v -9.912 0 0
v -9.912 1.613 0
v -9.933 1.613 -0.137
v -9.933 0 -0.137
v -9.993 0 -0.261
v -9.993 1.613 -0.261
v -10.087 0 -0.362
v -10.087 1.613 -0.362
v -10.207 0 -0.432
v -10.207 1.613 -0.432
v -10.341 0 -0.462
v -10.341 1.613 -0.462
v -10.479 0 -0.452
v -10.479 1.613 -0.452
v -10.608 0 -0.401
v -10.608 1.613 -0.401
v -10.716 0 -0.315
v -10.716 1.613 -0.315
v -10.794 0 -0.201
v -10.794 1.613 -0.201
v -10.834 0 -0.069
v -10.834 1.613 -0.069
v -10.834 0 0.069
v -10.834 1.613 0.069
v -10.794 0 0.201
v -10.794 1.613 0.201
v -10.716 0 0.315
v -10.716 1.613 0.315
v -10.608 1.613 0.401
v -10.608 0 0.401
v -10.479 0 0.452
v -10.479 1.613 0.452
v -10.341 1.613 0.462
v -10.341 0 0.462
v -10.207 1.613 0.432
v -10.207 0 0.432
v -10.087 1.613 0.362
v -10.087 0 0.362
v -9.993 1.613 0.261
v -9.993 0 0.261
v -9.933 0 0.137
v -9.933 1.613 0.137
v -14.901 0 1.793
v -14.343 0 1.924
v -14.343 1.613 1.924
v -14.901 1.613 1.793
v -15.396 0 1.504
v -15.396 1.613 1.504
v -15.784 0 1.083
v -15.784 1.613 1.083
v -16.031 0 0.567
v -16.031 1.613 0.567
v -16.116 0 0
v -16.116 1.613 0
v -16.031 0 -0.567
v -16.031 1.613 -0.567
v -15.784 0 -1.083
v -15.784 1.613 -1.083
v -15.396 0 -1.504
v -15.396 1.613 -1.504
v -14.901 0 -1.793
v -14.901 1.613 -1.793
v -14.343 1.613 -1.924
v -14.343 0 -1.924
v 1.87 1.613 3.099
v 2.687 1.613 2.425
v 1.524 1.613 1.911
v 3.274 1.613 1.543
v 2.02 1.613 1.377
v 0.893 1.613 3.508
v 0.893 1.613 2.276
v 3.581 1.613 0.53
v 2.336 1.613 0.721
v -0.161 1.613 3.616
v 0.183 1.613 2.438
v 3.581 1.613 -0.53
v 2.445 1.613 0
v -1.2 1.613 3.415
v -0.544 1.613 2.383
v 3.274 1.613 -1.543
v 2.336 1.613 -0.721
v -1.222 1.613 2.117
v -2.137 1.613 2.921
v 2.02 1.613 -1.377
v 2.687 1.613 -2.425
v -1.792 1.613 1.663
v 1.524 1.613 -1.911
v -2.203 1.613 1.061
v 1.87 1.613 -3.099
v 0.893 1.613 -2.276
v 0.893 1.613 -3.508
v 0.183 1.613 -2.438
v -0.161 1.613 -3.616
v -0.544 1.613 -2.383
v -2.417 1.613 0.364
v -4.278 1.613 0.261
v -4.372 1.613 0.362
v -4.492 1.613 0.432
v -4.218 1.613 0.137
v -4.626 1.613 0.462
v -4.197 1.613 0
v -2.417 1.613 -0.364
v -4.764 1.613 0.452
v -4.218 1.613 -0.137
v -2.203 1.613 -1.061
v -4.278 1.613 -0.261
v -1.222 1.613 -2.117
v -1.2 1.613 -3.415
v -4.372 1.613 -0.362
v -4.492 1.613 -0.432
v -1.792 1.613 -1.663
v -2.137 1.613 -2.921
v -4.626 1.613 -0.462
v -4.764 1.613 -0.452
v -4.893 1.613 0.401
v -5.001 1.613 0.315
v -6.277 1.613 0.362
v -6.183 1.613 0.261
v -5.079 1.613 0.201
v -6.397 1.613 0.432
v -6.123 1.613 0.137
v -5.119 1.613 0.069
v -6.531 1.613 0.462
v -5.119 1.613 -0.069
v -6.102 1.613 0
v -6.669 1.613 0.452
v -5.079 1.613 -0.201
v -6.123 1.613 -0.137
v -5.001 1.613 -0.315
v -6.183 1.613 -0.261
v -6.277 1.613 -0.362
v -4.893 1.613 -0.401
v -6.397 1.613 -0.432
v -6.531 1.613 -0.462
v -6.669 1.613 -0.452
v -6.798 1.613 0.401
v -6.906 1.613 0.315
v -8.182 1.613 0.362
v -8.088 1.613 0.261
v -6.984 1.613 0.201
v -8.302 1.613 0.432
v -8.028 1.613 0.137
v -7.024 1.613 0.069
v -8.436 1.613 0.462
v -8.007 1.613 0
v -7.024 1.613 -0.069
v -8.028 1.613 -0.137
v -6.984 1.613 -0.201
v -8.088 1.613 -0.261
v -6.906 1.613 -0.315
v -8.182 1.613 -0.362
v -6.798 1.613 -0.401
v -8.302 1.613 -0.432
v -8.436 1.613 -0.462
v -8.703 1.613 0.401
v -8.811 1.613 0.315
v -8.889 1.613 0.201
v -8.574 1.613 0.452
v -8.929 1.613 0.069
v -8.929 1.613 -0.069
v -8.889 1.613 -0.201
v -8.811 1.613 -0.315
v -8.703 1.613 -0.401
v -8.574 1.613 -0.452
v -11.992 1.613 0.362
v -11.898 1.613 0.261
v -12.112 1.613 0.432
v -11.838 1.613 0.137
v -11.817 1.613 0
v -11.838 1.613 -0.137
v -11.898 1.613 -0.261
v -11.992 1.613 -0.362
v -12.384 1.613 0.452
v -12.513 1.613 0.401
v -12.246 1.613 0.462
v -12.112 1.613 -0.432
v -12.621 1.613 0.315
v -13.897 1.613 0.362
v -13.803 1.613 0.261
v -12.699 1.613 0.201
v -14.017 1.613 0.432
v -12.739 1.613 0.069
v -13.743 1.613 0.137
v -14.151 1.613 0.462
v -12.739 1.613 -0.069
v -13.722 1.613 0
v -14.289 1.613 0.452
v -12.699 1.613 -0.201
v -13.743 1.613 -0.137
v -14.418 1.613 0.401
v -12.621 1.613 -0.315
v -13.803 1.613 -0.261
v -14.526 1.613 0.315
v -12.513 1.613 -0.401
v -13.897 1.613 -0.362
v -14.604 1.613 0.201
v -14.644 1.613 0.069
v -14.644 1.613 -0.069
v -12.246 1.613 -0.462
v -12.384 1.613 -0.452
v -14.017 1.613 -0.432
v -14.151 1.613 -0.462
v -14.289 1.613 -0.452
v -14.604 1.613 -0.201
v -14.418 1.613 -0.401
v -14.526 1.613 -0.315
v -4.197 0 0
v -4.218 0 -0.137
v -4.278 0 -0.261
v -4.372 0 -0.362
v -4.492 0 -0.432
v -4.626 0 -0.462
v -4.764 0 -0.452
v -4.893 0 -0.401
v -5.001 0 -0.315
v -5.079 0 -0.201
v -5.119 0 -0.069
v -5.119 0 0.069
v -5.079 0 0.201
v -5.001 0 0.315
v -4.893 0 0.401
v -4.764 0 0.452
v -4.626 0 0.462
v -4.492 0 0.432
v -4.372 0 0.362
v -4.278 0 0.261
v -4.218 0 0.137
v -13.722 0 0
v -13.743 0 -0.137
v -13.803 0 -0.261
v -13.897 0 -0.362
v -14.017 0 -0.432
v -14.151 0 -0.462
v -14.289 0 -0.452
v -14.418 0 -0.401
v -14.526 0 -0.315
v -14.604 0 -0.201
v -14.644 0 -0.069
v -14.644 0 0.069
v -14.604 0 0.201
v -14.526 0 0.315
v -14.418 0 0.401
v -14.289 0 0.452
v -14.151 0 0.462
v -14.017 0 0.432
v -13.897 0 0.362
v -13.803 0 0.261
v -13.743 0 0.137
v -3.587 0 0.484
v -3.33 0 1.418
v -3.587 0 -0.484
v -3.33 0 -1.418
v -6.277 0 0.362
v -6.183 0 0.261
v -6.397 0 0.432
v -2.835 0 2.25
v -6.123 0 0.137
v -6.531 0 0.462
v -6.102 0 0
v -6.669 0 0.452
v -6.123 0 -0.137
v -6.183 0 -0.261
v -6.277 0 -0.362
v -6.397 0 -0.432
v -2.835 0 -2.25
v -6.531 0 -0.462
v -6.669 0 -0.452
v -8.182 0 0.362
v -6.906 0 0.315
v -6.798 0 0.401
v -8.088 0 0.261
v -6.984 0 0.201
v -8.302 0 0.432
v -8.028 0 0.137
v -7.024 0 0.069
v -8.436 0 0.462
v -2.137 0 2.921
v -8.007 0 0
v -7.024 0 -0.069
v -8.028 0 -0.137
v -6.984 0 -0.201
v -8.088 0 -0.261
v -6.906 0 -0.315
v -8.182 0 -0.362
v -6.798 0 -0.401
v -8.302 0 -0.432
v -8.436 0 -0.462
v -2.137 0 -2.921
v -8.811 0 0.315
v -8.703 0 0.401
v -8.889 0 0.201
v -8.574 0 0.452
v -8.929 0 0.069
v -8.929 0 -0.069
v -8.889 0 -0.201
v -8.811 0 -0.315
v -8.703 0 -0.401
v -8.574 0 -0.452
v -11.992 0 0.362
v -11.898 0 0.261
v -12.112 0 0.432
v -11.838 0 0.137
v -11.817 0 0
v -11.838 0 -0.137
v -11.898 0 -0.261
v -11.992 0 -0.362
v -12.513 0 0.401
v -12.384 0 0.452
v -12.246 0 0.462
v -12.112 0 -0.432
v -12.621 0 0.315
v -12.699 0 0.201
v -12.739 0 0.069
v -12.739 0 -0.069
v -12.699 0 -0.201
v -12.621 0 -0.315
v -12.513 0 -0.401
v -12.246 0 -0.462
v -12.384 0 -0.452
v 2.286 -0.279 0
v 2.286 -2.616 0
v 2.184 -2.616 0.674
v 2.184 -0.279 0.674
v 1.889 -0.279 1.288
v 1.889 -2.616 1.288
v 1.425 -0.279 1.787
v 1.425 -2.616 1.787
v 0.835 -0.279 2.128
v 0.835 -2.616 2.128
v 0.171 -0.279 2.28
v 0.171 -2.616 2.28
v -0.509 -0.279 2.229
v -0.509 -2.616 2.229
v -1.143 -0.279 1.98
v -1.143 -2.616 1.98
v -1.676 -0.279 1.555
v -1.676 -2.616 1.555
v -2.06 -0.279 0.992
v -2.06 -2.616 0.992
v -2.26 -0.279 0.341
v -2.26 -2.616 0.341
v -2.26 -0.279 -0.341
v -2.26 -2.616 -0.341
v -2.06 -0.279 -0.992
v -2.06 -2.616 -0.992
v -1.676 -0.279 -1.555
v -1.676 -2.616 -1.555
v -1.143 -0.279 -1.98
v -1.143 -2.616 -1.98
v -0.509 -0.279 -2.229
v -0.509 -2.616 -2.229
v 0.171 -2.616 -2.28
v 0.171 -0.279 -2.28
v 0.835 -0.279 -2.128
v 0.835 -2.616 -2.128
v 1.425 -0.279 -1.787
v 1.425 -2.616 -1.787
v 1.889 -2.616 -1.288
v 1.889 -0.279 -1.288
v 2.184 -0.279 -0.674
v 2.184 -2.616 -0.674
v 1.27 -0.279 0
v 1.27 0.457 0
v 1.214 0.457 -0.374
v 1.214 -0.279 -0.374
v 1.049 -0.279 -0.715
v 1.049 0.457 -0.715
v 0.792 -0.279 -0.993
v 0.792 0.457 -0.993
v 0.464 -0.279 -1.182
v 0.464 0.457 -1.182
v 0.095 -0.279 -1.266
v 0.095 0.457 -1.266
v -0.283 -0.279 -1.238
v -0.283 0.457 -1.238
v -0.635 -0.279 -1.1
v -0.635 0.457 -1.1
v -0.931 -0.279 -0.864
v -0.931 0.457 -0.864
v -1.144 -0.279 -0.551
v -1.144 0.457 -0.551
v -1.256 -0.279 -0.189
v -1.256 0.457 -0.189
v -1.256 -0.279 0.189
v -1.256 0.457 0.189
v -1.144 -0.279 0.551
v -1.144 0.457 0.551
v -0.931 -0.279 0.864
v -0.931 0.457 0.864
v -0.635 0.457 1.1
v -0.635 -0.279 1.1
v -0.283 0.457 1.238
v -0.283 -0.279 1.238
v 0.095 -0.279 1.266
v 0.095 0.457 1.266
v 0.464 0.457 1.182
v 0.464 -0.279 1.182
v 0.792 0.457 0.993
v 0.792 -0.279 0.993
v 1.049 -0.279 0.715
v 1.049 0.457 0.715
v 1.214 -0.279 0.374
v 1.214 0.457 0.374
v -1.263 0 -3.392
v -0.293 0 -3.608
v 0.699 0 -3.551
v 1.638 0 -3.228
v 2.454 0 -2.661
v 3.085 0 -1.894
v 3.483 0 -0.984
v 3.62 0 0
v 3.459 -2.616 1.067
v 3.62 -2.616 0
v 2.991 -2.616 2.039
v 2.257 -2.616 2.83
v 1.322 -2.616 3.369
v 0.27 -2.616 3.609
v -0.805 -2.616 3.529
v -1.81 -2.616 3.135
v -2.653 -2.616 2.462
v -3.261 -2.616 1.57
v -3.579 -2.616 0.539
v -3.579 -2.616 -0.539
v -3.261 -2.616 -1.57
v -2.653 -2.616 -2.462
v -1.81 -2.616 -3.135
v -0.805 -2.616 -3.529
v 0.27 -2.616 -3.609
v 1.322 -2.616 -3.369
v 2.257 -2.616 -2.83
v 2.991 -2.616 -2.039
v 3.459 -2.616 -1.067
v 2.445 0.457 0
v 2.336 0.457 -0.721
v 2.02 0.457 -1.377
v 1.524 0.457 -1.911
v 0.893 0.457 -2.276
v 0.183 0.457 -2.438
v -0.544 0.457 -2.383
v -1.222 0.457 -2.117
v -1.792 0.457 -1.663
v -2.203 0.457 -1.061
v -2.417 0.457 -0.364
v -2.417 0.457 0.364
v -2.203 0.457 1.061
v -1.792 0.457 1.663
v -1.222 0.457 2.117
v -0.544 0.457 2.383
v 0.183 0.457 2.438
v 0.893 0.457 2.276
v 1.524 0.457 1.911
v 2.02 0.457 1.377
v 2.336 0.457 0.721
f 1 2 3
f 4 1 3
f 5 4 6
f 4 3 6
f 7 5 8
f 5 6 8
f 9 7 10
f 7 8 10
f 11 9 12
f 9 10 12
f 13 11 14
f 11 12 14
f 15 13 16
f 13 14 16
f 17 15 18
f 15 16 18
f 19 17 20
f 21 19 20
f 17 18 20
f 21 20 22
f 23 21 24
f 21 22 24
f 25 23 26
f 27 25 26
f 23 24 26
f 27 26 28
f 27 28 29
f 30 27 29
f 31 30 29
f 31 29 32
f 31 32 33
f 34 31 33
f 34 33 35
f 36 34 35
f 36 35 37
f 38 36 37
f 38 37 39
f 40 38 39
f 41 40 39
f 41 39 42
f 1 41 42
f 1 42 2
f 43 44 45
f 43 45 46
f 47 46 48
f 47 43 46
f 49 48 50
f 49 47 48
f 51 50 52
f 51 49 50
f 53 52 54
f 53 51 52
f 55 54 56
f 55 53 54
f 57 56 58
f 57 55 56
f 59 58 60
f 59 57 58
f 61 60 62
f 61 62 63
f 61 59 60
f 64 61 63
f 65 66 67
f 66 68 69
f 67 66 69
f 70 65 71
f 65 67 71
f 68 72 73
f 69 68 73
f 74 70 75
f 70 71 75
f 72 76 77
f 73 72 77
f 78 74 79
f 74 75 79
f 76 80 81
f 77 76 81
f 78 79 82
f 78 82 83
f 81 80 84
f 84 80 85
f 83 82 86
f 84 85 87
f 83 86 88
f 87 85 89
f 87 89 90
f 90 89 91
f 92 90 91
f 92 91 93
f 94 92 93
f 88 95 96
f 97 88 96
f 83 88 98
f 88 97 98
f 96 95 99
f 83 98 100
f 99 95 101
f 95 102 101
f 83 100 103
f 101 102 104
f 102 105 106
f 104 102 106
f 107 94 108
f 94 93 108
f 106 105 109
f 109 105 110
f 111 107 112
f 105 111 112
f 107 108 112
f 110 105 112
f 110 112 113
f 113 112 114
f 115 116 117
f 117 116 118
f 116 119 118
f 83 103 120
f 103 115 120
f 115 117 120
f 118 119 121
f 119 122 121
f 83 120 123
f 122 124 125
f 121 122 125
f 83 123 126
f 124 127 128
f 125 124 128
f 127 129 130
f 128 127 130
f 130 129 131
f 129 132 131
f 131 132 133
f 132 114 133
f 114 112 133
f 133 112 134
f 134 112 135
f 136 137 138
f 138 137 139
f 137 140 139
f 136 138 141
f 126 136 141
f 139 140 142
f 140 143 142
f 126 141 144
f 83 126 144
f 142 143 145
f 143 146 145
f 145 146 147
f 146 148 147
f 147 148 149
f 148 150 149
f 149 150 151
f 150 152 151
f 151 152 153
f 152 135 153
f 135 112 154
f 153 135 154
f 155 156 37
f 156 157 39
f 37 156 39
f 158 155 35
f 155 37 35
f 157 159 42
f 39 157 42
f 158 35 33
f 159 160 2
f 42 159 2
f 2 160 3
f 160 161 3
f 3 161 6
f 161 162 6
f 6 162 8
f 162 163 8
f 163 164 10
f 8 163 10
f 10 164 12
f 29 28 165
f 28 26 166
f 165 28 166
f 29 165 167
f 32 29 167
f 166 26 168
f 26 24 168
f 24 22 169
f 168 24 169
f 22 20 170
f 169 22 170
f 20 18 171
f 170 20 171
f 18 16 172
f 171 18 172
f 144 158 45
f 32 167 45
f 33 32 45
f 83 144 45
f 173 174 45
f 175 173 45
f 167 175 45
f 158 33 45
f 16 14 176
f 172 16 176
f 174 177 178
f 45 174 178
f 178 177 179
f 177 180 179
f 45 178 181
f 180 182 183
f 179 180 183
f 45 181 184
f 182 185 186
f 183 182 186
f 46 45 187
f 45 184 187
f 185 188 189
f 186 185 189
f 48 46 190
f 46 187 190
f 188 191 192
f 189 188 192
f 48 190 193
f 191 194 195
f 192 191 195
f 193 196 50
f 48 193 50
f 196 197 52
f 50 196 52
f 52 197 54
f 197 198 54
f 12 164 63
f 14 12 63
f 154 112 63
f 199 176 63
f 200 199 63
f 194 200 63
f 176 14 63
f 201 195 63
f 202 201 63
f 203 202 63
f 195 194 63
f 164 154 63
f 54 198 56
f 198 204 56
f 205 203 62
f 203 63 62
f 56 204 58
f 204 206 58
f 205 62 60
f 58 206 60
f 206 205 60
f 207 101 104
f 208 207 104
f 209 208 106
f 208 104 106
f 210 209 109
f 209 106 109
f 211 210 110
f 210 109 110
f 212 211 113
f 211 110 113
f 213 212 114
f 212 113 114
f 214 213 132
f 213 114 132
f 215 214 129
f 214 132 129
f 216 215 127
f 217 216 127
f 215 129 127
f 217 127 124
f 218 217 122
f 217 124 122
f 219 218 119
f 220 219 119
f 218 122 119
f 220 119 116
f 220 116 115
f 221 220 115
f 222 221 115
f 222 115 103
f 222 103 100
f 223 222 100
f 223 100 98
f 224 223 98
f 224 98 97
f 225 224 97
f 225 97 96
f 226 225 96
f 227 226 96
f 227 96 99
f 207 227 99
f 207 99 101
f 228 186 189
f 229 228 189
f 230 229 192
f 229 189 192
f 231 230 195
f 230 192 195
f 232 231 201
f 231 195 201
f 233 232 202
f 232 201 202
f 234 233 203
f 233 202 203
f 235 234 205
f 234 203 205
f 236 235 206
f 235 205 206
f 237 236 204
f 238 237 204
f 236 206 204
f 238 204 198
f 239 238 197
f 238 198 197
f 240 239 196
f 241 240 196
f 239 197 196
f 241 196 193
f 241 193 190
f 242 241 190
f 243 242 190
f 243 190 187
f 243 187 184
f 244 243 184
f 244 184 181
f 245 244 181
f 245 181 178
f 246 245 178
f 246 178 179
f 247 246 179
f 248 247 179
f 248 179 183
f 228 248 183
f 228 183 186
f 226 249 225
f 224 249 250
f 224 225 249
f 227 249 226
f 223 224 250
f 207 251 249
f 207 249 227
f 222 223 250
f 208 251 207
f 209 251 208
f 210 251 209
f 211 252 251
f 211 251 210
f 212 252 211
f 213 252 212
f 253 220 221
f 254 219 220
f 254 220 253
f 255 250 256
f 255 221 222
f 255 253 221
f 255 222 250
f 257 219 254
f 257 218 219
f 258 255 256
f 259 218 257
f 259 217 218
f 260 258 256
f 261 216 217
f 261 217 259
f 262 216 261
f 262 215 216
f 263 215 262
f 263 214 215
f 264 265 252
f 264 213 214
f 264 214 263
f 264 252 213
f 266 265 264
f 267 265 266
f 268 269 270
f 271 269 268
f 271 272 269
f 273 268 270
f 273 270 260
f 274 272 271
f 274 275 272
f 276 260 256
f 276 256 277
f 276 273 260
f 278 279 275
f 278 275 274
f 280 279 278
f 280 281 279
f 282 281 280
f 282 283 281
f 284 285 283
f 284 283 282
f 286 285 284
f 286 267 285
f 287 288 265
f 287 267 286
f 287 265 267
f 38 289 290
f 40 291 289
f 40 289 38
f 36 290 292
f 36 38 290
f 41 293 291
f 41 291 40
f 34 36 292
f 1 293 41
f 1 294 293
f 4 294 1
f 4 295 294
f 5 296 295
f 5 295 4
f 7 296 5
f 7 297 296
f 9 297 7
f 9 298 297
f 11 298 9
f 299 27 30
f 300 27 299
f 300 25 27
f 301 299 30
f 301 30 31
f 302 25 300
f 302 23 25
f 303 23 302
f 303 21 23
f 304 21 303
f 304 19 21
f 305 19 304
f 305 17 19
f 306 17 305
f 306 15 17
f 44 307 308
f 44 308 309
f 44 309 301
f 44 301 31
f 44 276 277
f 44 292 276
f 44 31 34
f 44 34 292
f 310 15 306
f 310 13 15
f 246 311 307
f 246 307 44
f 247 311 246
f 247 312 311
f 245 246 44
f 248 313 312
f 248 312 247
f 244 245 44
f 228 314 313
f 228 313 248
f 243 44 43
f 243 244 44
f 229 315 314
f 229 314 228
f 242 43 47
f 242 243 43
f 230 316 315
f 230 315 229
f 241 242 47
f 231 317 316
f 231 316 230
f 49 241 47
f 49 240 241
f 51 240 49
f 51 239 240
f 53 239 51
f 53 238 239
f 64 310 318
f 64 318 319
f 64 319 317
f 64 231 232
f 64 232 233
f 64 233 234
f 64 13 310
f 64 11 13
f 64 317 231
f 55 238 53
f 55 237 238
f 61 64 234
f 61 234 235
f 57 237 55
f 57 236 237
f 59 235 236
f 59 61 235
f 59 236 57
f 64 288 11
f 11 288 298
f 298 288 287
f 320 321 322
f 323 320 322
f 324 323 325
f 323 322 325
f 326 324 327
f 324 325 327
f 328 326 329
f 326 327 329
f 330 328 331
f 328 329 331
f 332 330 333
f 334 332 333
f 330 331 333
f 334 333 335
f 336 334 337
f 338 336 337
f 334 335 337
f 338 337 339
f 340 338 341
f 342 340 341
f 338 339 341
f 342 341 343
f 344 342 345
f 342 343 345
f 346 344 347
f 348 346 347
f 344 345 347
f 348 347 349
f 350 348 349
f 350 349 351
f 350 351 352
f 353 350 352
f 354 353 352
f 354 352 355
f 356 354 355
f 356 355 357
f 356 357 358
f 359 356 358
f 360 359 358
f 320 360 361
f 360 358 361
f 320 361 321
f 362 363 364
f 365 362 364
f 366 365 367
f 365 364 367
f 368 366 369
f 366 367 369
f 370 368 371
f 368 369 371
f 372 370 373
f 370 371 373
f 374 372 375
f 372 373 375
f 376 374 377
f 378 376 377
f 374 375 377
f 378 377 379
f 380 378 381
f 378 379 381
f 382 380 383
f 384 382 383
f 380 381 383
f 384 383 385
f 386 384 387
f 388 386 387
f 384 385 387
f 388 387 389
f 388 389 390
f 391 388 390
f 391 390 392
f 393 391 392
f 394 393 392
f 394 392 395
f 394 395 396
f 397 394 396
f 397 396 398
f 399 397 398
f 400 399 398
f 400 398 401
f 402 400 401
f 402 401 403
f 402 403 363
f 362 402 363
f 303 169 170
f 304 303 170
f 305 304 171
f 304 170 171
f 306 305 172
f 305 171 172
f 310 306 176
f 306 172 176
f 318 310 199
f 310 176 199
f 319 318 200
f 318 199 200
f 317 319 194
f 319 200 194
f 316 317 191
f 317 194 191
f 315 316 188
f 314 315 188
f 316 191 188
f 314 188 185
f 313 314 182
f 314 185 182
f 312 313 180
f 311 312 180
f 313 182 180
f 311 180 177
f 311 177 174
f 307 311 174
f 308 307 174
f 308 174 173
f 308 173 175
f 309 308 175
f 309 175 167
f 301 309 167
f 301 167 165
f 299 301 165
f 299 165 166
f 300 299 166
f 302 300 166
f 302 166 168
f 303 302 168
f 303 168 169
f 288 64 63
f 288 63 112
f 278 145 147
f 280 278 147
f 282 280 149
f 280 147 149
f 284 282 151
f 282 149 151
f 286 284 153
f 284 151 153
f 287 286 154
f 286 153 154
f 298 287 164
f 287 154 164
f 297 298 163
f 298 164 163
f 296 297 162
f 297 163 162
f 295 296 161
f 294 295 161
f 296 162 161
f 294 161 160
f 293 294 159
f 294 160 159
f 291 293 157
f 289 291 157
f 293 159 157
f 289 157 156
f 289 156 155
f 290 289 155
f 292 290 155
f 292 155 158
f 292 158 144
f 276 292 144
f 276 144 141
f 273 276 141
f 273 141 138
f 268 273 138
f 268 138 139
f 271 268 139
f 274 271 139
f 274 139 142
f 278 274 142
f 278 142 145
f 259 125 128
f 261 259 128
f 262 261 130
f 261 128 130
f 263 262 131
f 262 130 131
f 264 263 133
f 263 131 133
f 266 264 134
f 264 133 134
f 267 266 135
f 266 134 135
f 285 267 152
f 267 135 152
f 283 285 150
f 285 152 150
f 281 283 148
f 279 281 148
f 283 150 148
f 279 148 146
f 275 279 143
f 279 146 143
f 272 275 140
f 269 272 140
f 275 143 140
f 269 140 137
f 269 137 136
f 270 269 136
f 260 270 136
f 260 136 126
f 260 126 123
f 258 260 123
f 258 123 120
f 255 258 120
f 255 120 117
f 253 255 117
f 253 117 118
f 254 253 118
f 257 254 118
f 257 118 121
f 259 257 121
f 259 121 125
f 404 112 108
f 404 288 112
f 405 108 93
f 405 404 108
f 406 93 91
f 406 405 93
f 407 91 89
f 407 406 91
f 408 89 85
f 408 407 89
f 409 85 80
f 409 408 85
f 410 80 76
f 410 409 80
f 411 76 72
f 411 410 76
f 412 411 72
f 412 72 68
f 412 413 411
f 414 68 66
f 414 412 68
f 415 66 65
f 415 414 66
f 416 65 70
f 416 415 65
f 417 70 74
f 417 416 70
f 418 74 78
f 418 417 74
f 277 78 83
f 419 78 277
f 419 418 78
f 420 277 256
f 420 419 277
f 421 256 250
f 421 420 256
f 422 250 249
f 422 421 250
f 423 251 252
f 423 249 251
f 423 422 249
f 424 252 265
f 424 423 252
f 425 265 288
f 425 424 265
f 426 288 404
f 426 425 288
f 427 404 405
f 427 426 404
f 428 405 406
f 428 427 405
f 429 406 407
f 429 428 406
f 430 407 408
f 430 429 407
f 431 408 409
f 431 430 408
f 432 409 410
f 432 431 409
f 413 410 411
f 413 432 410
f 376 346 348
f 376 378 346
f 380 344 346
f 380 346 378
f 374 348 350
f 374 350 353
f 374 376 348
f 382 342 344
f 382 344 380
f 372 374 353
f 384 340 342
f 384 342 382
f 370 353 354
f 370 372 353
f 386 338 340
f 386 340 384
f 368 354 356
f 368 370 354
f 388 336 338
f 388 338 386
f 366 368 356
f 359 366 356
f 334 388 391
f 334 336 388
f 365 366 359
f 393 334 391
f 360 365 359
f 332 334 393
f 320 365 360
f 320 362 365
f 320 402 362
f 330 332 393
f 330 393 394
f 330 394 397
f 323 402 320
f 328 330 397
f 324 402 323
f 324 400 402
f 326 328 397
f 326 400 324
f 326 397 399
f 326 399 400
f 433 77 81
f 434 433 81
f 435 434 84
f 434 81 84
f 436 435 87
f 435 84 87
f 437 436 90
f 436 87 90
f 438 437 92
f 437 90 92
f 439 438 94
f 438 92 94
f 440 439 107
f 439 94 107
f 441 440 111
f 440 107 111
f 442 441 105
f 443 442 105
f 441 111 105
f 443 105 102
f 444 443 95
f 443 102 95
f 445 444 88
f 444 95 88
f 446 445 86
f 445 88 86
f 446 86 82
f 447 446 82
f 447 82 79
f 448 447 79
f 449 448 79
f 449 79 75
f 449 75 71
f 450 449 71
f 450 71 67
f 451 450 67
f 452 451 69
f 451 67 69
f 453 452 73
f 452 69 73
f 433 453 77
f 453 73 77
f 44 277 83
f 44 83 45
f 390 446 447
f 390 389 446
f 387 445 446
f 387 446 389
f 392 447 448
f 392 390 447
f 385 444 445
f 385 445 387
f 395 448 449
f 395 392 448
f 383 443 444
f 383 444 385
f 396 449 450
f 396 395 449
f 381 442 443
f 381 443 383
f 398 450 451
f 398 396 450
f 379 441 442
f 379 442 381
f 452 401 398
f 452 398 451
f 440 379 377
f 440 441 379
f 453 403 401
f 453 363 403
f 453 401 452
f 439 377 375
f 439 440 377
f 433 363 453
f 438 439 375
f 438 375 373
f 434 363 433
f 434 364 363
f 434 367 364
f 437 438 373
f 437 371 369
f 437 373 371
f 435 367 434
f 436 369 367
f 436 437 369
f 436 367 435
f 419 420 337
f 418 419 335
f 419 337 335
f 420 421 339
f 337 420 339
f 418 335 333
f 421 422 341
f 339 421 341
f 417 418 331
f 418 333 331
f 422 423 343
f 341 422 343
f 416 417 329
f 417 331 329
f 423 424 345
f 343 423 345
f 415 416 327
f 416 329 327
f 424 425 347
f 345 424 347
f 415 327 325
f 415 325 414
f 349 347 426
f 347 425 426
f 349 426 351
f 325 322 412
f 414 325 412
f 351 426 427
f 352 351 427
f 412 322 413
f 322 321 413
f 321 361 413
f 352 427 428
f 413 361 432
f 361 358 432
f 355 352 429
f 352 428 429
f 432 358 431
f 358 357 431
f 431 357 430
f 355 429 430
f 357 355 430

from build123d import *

# Parameters (mm, degrees)
EXTRUDE17_DEPTH = 1.6129
SKETCH19_R      = 3.6195
EXTRUDE19_DEPTH = 4.2291
SKETCH20_R      = 0.46355
SKETCH20_R_2    = 1.27
EXTRUDE20_DEPTH = 5.2291
SKETCH21_R      = 2.44475
EXTRUDE21_DEPTH = 1.1557
SKETCH22_R      = 2.286
EXTRUDE22_DEPTH = 2.3368


with BuildPart() as part:
    # Sketch18 → Extrude17 (new body)
    with BuildSketch(Plane(origin=(0, 0, 0), x_dir=(1, 0, 0), z_dir=(0, 1, 0))):
        with BuildLine():
            Line((-14.34305969, 1.923991942), (-2.13741415, 2.921))
            ThreePointArc((-2.13741415, 2.921), (3.6195, 0), (-2.13741415, -2.921))
            Line((-2.13741415, -2.921), (-14.34305969, -1.923991942))
            ThreePointArc((-14.34305969, -1.923991942), (-16.1163, 0), (-14.34305969, 1.923991942))
        make_face()
    extrude(amount=EXTRUDE17_DEPTH)

    # Sketch19 → Extrude19 (add)
    with BuildSketch(Plane(origin=(0, 1.6129, 0), x_dir=(1, 0, 0), z_dir=(0, 1, 0))):
        Circle(SKETCH19_R)
    extrude(amount=-EXTRUDE19_DEPTH)

    # Sketch20 → Extrude20 (cut, through all)
    with BuildSketch(Plane(origin=(0, 1.6129, 0), x_dir=(1, 0, 0), z_dir=(0, 1, 0))):
        with Locations((-14.1859, 0)):
            Circle(SKETCH20_R)
        Circle(SKETCH20_R_2)
        with Locations((-4.6609, 0)):
            Circle(SKETCH20_R)
        with Locations((-6.5659, 0)):
            Circle(SKETCH20_R)
        with Locations((-8.4709, 0)):
            Circle(SKETCH20_R)
        with Locations((-10.3759, 0)):
            Circle(SKETCH20_R)
        with Locations((-12.2809, 0)):
            Circle(SKETCH20_R)
    extrude(amount=-EXTRUDE20_DEPTH, mode=Mode.SUBTRACT)

    # Sketch21 → Extrude21 (cut)
    with BuildSketch(Plane(origin=(0, 1.6129, 0), x_dir=(1, 0, 0), z_dir=(0, 1, 0))):
        Circle(SKETCH21_R)
    extrude(amount=-EXTRUDE21_DEPTH, mode=Mode.SUBTRACT)

    # Sketch22 → Extrude22 (cut)
    with BuildSketch(Plane.XZ.offset(2.6162)):
        Circle(SKETCH22_R)
    extrude(amount=-EXTRUDE22_DEPTH, mode=Mode.SUBTRACT)


solid = part.part
